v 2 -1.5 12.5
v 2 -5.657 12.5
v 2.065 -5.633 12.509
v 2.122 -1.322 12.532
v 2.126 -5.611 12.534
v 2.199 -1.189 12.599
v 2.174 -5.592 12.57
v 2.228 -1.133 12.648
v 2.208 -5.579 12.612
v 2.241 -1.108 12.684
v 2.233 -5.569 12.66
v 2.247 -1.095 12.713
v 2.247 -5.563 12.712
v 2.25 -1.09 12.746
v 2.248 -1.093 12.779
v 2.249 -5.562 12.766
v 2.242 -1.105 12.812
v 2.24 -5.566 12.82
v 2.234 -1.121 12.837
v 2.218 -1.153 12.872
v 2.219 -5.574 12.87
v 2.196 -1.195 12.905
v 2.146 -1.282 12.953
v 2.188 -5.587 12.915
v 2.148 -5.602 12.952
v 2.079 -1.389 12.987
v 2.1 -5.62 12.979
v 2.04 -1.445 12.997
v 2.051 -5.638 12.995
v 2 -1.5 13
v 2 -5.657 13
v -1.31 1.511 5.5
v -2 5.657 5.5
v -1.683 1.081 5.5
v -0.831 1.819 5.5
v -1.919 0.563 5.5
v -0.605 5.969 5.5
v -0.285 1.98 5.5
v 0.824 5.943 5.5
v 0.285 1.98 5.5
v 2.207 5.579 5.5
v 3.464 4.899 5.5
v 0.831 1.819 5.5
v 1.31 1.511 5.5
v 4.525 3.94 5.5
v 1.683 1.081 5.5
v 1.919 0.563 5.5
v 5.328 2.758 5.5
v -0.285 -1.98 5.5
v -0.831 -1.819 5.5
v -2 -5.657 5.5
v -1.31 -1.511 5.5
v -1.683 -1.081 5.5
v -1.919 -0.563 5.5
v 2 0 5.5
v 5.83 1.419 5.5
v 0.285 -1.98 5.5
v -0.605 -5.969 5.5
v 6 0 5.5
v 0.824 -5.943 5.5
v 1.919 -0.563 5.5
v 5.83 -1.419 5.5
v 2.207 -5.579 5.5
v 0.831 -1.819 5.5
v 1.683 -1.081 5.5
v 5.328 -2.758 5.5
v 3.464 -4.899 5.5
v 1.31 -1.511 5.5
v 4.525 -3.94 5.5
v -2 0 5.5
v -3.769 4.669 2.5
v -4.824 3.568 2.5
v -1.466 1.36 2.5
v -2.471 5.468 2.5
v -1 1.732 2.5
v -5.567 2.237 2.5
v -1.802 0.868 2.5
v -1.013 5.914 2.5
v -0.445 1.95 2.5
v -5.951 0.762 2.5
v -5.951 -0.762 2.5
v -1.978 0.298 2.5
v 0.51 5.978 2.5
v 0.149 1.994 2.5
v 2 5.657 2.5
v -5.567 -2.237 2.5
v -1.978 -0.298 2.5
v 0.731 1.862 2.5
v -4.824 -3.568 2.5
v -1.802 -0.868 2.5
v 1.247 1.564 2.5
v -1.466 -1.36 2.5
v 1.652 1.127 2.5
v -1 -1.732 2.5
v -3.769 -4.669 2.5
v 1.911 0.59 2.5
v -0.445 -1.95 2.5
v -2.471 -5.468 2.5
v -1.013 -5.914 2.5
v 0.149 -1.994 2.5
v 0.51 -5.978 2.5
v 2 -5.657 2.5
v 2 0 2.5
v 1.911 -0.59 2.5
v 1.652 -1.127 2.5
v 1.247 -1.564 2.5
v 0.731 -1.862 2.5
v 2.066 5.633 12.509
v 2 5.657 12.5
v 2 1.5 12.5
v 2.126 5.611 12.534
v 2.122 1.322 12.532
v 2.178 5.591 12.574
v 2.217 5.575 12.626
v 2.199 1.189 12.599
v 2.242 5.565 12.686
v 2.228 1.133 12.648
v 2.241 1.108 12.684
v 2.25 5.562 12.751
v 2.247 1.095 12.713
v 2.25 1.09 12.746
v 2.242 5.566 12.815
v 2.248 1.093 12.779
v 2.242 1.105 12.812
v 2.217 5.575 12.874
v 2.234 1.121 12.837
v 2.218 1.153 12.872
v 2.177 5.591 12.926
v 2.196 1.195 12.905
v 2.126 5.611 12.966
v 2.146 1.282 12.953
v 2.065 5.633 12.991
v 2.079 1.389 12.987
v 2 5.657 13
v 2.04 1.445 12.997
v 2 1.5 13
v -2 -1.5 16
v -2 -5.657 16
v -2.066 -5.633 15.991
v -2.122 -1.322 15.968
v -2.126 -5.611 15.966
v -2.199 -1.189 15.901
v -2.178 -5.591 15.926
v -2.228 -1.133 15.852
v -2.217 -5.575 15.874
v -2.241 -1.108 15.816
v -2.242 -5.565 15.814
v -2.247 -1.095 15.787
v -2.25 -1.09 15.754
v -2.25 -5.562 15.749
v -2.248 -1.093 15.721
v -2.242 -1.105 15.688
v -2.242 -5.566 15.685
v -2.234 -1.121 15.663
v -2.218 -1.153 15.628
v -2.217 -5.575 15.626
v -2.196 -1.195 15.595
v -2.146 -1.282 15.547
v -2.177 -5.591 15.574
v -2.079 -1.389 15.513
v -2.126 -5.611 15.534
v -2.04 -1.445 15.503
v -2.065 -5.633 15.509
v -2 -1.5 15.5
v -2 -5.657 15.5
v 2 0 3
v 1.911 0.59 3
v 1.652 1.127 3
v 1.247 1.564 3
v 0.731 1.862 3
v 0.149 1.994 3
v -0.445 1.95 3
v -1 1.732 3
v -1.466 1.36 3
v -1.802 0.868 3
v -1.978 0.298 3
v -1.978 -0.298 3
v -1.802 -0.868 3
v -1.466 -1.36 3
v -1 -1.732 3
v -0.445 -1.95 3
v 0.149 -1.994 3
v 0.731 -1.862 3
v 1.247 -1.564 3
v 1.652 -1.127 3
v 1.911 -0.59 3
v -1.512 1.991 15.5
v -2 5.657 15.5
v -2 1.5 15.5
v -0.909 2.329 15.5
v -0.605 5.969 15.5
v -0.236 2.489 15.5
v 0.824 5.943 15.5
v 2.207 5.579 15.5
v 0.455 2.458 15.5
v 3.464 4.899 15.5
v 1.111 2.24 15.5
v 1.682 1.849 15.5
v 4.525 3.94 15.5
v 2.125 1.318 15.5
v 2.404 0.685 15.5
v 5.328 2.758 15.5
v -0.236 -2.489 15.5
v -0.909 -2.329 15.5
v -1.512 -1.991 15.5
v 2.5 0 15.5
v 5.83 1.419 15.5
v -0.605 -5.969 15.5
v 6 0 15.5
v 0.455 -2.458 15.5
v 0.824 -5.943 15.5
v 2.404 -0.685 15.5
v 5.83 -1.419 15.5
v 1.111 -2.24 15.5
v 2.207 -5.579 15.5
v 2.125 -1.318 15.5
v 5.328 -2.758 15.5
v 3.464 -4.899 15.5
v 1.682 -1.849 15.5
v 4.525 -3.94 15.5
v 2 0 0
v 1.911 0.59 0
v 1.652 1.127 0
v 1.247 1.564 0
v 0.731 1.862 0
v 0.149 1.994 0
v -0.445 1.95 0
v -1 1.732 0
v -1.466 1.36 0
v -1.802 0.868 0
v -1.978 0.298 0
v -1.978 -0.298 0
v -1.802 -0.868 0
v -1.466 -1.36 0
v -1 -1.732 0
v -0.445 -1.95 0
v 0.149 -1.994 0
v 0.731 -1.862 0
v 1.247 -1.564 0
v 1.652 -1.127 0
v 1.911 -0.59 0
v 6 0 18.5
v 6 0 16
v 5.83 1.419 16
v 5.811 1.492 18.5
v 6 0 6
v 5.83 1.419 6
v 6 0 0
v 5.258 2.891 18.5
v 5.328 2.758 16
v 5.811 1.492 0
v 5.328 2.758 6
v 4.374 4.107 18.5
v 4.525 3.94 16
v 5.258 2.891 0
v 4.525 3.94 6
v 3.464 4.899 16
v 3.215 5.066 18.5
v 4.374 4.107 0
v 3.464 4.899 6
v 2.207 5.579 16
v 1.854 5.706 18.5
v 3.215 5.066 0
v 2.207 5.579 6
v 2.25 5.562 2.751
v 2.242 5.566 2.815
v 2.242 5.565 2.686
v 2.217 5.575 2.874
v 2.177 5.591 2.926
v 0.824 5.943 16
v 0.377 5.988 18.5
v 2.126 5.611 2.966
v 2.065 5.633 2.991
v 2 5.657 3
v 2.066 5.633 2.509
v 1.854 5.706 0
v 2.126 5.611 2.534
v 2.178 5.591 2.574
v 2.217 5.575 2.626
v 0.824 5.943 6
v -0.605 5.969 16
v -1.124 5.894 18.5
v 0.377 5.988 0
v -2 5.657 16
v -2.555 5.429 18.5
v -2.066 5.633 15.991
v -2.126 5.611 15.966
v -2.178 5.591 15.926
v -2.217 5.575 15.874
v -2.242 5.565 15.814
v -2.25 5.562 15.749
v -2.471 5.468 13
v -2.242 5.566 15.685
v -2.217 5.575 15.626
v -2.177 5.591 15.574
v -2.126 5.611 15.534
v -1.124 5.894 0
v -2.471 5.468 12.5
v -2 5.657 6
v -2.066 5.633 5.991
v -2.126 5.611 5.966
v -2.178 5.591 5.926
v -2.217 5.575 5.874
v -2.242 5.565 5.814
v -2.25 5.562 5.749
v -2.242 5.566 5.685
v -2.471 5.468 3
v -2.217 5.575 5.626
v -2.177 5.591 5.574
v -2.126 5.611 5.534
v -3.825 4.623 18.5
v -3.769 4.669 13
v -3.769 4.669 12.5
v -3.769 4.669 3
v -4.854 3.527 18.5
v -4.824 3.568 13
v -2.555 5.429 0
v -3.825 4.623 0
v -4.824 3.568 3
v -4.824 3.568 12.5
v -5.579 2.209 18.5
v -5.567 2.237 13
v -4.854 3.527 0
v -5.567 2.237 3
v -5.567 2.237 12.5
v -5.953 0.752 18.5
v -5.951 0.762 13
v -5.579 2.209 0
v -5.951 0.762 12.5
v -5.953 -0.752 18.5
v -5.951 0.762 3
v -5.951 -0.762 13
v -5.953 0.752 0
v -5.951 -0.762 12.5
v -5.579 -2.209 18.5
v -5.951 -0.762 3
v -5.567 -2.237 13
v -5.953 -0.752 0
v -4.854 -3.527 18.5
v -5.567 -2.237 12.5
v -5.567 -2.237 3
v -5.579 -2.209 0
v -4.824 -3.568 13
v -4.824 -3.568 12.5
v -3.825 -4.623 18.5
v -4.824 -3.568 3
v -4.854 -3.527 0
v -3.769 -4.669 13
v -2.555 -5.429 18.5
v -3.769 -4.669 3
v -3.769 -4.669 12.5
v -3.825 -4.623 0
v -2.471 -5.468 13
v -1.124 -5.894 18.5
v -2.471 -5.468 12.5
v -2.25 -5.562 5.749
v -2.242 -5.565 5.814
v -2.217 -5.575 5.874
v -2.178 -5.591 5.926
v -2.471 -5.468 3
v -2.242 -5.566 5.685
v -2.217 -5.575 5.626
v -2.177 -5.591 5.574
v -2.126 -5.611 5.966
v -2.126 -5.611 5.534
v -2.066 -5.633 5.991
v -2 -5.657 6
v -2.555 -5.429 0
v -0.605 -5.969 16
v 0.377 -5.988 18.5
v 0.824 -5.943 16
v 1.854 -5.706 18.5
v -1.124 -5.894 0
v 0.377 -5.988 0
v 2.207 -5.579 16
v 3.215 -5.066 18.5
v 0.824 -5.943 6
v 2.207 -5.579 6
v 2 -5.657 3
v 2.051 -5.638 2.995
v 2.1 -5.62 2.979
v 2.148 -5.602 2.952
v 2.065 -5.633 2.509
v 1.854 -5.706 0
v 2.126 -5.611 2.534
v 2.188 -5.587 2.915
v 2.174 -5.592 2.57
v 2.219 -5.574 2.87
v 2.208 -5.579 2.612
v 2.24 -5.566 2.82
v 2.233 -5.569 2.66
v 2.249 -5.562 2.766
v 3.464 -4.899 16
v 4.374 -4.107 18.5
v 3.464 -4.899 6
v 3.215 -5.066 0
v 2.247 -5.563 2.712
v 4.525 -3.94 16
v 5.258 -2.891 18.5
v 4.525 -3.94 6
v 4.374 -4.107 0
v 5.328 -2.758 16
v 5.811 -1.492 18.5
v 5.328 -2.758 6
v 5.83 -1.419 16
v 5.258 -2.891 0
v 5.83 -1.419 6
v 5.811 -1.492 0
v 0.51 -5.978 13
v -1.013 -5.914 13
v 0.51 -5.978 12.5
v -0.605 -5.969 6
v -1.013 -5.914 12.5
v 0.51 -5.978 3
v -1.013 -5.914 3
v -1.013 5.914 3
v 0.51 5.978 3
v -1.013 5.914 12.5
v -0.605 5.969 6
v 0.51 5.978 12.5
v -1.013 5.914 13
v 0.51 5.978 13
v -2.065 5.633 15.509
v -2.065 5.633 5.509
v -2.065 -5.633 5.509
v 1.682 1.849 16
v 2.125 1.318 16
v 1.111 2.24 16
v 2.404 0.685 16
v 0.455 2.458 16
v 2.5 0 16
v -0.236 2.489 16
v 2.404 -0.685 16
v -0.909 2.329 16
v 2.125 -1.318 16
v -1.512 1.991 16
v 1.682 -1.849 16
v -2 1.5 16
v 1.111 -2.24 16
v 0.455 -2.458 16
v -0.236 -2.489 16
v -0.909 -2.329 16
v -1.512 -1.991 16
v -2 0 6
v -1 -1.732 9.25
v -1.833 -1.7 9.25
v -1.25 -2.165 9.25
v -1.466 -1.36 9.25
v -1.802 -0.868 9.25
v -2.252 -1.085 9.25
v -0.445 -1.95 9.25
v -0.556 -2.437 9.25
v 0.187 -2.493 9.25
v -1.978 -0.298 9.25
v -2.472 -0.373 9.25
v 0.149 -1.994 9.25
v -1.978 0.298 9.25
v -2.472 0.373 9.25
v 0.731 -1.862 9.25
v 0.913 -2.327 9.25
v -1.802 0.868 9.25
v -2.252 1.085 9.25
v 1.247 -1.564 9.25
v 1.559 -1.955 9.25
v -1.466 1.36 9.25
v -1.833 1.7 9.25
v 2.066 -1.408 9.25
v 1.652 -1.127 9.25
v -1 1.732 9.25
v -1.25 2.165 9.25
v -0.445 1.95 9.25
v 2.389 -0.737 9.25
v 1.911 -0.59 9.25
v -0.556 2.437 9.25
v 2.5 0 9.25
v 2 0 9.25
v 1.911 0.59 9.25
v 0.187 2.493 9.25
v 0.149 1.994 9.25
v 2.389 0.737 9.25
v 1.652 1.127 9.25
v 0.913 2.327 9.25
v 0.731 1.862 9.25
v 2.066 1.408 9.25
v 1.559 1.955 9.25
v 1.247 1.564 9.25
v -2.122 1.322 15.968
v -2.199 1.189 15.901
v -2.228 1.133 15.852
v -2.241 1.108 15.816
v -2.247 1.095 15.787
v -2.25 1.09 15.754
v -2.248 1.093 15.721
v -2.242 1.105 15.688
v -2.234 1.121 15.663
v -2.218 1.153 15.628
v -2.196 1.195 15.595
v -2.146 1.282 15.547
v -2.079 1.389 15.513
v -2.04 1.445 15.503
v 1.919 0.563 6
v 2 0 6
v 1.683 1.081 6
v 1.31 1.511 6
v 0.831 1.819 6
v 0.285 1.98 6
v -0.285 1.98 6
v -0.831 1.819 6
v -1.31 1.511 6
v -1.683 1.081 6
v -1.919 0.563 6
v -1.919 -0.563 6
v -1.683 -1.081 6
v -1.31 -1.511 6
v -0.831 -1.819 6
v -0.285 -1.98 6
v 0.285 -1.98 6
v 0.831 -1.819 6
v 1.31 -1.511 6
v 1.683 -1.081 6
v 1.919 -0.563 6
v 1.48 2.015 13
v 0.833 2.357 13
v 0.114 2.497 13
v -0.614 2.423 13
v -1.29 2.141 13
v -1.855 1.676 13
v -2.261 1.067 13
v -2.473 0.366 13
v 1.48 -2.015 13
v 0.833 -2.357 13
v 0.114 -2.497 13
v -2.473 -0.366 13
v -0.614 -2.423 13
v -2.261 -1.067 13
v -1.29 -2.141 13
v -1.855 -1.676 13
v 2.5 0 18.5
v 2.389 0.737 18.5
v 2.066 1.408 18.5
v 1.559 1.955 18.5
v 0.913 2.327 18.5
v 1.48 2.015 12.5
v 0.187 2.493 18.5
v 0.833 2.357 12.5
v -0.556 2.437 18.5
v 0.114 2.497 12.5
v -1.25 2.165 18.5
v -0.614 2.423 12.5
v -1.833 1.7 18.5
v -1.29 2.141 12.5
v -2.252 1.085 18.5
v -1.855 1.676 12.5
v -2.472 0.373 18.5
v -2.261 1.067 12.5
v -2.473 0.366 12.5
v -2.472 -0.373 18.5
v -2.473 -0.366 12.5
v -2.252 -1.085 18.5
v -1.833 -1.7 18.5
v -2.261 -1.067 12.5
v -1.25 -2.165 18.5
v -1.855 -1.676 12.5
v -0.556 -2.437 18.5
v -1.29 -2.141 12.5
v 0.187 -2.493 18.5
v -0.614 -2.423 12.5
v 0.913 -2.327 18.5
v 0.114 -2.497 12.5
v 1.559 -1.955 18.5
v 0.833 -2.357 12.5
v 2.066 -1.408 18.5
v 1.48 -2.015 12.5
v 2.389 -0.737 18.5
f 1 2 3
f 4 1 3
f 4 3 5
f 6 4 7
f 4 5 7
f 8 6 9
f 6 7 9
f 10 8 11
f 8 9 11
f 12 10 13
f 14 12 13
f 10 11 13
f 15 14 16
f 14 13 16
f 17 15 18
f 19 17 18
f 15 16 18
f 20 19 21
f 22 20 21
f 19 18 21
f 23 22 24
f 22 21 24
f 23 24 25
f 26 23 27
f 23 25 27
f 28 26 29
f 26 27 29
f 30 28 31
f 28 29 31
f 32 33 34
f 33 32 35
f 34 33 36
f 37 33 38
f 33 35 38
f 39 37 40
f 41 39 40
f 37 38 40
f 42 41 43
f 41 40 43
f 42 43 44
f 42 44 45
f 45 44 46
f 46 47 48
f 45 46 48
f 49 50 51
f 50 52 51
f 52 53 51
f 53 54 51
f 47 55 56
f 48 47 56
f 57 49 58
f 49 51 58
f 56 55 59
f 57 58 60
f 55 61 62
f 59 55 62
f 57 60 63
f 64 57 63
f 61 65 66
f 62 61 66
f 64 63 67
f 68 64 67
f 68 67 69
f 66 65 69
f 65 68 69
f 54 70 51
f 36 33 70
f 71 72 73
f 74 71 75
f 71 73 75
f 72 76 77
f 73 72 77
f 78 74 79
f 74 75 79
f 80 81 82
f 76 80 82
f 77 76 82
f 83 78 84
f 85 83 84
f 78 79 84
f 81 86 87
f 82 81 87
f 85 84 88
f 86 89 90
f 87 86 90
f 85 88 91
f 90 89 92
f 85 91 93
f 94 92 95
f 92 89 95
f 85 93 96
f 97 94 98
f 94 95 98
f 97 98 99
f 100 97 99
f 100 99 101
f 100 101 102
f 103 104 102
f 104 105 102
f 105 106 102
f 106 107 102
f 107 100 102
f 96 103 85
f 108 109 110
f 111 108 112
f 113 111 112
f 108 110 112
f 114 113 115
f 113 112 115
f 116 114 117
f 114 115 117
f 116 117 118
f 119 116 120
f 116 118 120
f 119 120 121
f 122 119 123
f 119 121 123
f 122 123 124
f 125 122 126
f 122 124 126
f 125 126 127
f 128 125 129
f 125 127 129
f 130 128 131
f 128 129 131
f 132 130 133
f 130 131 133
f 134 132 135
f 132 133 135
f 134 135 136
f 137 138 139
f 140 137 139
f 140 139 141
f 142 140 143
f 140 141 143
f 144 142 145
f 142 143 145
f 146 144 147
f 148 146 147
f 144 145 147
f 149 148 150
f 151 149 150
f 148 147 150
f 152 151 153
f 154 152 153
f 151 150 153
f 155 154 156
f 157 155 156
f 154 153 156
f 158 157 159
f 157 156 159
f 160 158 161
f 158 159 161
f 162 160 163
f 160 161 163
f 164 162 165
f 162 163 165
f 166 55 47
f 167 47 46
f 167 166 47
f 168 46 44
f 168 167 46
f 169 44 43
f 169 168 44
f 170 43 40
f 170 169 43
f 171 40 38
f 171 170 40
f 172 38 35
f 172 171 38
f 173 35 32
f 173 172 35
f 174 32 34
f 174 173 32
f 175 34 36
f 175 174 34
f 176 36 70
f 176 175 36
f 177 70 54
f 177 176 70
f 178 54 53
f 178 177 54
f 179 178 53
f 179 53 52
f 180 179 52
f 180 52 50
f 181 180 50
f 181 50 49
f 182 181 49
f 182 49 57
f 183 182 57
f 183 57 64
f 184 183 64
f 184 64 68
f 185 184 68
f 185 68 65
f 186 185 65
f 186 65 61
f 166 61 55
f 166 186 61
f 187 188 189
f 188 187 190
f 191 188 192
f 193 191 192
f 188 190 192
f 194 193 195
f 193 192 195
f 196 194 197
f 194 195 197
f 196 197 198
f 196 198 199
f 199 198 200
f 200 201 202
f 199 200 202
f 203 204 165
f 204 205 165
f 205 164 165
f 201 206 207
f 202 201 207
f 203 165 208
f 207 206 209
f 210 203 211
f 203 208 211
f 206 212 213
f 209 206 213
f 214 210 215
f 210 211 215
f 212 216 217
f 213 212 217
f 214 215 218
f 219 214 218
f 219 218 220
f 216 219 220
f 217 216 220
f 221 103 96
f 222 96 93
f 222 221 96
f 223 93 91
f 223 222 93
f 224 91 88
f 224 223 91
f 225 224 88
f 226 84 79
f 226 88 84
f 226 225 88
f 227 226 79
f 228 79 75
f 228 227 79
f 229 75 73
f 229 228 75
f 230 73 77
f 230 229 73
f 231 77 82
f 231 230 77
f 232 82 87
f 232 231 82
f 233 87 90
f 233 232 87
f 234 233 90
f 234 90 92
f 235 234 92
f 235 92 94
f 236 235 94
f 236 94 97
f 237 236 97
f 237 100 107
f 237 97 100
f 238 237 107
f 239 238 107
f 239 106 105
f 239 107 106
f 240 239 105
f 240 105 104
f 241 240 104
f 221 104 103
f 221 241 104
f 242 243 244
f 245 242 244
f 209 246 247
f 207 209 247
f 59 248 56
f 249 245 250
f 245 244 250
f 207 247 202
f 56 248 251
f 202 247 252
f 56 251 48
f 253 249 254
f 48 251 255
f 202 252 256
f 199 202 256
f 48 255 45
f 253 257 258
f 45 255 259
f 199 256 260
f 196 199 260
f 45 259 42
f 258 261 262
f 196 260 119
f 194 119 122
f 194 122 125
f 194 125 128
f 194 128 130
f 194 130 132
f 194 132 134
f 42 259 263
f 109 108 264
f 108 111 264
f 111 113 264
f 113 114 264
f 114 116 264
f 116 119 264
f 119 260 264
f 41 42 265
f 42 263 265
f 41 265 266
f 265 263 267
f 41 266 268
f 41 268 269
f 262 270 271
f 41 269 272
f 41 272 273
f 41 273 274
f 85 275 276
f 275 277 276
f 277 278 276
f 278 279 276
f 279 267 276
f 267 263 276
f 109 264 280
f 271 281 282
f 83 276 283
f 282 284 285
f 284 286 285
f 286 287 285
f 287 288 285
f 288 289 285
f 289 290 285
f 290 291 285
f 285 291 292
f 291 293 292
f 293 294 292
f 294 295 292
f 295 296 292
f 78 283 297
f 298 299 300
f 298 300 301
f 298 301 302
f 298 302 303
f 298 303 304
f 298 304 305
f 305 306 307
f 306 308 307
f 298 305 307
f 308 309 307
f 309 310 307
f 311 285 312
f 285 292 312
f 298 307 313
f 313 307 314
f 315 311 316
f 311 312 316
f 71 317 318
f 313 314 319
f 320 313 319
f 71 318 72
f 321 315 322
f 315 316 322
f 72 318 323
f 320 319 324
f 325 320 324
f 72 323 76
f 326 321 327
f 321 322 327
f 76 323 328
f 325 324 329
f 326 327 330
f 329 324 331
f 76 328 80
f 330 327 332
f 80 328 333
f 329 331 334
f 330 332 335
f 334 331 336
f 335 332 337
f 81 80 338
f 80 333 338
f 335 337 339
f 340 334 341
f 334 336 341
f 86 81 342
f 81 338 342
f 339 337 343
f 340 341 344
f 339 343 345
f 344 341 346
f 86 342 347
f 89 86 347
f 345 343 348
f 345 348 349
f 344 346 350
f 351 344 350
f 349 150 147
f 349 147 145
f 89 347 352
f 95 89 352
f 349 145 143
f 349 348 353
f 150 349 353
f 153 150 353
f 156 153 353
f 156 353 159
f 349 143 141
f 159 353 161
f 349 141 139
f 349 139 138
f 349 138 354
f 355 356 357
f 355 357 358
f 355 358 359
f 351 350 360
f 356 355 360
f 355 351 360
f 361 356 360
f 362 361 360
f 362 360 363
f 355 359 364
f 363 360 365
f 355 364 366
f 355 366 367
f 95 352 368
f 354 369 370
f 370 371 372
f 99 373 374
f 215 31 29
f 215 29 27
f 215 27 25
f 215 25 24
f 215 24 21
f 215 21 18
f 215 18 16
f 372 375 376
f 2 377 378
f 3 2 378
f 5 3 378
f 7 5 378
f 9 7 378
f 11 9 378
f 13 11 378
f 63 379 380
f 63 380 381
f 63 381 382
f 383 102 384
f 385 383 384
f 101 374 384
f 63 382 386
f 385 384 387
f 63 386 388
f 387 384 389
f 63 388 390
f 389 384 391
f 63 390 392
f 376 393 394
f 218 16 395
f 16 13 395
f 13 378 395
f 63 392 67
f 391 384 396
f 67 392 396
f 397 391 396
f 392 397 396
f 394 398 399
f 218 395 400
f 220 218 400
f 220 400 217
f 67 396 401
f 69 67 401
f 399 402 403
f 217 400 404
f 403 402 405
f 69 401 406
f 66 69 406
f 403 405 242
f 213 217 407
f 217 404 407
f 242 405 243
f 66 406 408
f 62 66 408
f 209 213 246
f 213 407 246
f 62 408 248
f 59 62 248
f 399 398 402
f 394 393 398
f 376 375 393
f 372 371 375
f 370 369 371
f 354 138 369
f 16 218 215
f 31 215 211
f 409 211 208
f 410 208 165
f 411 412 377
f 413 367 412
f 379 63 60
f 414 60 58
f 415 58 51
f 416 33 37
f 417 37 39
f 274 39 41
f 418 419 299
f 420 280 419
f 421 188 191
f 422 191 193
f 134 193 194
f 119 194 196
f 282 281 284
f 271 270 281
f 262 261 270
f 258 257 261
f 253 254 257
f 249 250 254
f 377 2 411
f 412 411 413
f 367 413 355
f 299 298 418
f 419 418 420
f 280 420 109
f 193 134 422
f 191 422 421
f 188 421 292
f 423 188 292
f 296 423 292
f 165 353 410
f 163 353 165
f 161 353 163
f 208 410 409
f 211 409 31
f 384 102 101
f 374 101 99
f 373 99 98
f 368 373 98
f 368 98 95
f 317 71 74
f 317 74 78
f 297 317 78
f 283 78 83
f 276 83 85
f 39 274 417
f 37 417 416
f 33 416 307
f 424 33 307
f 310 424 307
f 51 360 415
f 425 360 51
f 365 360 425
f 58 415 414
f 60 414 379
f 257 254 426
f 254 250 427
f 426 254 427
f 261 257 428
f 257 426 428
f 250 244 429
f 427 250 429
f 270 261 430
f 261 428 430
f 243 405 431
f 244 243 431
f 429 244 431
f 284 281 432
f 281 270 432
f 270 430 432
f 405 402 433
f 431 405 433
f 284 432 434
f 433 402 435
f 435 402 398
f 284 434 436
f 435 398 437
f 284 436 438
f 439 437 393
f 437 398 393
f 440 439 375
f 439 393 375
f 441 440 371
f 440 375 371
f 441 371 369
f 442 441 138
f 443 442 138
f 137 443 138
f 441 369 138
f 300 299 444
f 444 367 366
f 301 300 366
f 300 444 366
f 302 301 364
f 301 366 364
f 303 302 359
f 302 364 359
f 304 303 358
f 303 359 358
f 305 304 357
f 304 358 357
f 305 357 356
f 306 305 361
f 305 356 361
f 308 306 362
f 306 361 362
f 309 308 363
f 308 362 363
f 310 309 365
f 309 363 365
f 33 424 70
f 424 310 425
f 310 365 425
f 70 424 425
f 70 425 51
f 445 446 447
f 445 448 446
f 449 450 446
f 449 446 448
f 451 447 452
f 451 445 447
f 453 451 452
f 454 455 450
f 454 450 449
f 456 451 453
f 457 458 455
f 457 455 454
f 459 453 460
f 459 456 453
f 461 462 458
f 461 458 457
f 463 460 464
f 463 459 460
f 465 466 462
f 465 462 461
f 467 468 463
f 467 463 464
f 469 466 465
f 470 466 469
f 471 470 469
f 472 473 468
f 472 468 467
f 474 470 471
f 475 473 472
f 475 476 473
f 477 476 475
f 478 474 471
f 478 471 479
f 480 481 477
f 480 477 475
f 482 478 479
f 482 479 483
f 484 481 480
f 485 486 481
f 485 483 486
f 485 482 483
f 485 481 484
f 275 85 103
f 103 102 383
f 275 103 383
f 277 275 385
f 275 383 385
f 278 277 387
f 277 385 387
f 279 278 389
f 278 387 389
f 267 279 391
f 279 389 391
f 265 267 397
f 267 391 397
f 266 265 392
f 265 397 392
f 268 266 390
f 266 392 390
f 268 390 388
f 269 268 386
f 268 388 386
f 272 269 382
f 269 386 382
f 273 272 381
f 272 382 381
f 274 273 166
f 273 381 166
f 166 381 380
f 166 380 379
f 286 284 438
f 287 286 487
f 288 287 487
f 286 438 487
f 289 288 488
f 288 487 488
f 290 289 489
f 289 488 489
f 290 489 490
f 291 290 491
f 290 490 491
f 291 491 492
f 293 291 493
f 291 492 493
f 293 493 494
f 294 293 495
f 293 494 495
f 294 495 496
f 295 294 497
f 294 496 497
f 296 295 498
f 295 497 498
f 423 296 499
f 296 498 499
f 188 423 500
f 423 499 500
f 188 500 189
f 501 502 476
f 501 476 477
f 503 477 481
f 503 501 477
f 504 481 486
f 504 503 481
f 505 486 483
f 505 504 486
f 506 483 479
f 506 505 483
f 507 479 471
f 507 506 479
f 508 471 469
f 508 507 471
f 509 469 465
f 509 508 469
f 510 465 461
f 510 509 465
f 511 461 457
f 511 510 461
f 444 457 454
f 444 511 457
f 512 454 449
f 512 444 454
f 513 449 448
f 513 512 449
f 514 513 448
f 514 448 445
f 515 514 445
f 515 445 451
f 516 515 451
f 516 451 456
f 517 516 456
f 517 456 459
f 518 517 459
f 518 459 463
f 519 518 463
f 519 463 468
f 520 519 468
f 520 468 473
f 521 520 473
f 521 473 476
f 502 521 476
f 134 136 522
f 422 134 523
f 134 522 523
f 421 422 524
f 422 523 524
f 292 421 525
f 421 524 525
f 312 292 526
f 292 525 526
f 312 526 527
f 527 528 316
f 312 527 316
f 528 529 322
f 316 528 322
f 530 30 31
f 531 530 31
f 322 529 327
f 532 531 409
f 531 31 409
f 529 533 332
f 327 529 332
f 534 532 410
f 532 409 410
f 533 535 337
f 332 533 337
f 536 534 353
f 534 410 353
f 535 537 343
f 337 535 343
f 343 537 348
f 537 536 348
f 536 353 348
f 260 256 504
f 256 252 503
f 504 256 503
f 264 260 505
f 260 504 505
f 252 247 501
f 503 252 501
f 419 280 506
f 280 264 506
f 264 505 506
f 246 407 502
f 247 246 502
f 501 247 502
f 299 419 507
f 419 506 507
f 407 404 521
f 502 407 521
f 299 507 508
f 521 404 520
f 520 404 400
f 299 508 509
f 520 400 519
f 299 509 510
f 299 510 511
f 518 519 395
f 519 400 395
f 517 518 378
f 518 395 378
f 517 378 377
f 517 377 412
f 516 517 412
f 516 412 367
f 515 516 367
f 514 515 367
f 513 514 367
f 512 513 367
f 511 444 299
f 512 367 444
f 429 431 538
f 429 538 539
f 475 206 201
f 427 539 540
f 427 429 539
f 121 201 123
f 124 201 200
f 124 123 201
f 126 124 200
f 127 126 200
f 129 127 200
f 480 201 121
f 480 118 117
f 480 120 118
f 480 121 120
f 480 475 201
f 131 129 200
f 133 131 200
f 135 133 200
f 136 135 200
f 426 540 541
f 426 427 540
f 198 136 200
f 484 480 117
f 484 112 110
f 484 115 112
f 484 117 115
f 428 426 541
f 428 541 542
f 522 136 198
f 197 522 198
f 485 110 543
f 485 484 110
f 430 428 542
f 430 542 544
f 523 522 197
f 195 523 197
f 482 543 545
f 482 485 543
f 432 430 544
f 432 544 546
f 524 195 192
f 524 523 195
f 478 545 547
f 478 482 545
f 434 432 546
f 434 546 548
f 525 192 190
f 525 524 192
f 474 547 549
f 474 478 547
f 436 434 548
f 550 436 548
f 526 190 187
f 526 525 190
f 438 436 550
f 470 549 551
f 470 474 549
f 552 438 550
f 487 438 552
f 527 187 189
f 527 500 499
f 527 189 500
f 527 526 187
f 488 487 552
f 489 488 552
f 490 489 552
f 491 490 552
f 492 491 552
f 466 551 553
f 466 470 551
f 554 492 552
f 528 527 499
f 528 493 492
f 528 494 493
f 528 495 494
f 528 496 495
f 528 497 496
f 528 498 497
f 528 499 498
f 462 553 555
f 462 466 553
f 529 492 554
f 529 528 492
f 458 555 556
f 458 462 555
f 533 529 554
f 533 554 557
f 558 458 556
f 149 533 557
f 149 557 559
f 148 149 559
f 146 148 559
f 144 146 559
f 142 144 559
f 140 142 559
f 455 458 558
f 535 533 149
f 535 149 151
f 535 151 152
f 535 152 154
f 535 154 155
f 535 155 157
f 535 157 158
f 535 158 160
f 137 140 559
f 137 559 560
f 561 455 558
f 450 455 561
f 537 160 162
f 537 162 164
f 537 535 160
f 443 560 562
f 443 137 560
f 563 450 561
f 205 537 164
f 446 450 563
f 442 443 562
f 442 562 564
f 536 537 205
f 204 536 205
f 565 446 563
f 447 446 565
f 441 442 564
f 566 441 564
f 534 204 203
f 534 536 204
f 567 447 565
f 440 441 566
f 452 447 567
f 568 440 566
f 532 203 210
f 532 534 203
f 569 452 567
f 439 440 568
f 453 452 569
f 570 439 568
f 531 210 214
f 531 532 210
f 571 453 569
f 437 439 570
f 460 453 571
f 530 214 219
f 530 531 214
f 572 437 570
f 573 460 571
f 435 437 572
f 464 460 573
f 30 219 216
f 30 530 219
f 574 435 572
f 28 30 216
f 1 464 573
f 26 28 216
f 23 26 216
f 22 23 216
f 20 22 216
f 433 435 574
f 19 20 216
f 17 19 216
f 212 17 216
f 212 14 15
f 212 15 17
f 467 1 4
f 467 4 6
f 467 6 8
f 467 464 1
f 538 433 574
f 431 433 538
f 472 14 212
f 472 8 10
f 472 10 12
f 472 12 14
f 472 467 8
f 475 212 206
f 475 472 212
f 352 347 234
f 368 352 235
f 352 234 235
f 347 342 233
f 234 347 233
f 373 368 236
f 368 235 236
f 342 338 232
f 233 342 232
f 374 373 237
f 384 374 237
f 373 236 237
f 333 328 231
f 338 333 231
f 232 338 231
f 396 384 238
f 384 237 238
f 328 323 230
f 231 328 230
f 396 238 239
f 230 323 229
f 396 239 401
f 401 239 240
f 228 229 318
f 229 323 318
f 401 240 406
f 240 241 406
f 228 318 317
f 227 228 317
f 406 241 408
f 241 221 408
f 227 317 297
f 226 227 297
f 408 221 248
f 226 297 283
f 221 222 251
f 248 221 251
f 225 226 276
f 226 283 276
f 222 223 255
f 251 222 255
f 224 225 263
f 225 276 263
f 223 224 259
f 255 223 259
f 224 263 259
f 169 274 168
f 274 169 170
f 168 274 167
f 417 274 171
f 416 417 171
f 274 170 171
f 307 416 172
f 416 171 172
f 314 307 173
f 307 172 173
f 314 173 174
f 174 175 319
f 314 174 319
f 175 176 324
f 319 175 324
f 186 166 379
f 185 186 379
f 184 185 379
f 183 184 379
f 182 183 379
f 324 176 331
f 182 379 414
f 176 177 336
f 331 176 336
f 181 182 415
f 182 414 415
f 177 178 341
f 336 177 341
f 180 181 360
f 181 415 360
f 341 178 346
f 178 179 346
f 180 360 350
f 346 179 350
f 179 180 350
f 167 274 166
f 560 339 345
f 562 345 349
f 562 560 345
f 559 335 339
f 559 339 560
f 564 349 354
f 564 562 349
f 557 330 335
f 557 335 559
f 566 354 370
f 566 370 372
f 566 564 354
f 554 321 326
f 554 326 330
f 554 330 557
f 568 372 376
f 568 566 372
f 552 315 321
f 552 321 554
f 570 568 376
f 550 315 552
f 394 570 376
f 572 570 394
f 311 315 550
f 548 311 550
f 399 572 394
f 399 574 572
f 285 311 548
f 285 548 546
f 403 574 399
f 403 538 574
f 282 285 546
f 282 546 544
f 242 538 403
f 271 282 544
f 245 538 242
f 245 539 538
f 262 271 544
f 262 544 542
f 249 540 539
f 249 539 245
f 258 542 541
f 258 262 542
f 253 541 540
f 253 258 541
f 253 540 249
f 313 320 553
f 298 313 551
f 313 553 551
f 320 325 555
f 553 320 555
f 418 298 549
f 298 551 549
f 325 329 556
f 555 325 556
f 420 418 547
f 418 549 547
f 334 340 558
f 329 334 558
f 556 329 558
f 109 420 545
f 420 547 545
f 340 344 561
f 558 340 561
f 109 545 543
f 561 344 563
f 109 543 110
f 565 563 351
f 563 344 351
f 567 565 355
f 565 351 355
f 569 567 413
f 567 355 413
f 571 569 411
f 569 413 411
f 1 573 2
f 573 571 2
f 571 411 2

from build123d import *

# Parameters (mm, degrees)
SKETCH_1_R               = 6
SKETCH_1_R_2             = 2
EXTRUDE_1_DEPTH          = 9.25
SKETCH_2_R               = 6
SKETCH_2_R_2             = 2.5
EXTRUDE_2_DEPTH          = 9.25
CUT_EXTRUDE_1_DEPTH      = 10
CUT_EXTRUDE_1_DEPTH_BACK = 10


with BuildPart() as part:
    # 스케치1 → 보스-돌출1 (new body)
    with BuildSketch(Plane.XY):
        Circle(SKETCH_1_R)
        Circle(SKETCH_1_R_2, mode=Mode.SUBTRACT)
    extrude(amount=EXTRUDE_1_DEPTH)

    # 스케치2 → 보스-돌출2 (add)
    with BuildSketch(Plane.XY.offset(9.25)):
        Circle(SKETCH_2_R)
        Circle(SKETCH_2_R_2, mode=Mode.SUBTRACT)
    extrude(amount=EXTRUDE_2_DEPTH)

    # 스케치3 → 컷-돌출1 (cut, two sides: drawn at the far end of the back side and taken through both)
    with BuildSketch(Plane(origin=(0, 0, 0), x_dir=(1, 0, 0), z_dir=(0, 1, 0)).offset(-CUT_EXTRUDE_1_DEPTH_BACK)):
        with BuildLine():
            Line((-6, -2.5), (2, -2.5))
            ThreePointArc((2, -2.5), (2.25, -2.75), (2, -3))
            Line((2, -3), (-6, -3))
            Line((-6, -3), (-6, -2.5))
        make_face()
        with BuildLine():
            Line((-6, -12.5), (2, -12.5))
            ThreePointArc((2, -12.5), (2.25, -12.75), (2, -13))
            Line((2, -13), (-6, -13))
            Line((-6, -13), (-6, -12.5))
        make_face()
        with BuildLine():
            Line((6, -6), (-2, -6))
            ThreePointArc((-2, -6), (-2.25, -5.75), (-2, -5.5))
            Line((-2, -5.5), (6, -5.5))
            Line((6, -5.5), (6, -6))
        make_face()
        with BuildLine():
            Line((6, -16), (-2, -16))
            ThreePointArc((-2, -16), (-2.25, -15.75), (-2, -15.5))
            Line((-2, -15.5), (6, -15.5))
            Line((6, -15.5), (6, -16))
        make_face()
    extrude(amount=CUT_EXTRUDE_1_DEPTH + CUT_EXTRUDE_1_DEPTH_BACK, mode=Mode.SUBTRACT)


solid = part.part
